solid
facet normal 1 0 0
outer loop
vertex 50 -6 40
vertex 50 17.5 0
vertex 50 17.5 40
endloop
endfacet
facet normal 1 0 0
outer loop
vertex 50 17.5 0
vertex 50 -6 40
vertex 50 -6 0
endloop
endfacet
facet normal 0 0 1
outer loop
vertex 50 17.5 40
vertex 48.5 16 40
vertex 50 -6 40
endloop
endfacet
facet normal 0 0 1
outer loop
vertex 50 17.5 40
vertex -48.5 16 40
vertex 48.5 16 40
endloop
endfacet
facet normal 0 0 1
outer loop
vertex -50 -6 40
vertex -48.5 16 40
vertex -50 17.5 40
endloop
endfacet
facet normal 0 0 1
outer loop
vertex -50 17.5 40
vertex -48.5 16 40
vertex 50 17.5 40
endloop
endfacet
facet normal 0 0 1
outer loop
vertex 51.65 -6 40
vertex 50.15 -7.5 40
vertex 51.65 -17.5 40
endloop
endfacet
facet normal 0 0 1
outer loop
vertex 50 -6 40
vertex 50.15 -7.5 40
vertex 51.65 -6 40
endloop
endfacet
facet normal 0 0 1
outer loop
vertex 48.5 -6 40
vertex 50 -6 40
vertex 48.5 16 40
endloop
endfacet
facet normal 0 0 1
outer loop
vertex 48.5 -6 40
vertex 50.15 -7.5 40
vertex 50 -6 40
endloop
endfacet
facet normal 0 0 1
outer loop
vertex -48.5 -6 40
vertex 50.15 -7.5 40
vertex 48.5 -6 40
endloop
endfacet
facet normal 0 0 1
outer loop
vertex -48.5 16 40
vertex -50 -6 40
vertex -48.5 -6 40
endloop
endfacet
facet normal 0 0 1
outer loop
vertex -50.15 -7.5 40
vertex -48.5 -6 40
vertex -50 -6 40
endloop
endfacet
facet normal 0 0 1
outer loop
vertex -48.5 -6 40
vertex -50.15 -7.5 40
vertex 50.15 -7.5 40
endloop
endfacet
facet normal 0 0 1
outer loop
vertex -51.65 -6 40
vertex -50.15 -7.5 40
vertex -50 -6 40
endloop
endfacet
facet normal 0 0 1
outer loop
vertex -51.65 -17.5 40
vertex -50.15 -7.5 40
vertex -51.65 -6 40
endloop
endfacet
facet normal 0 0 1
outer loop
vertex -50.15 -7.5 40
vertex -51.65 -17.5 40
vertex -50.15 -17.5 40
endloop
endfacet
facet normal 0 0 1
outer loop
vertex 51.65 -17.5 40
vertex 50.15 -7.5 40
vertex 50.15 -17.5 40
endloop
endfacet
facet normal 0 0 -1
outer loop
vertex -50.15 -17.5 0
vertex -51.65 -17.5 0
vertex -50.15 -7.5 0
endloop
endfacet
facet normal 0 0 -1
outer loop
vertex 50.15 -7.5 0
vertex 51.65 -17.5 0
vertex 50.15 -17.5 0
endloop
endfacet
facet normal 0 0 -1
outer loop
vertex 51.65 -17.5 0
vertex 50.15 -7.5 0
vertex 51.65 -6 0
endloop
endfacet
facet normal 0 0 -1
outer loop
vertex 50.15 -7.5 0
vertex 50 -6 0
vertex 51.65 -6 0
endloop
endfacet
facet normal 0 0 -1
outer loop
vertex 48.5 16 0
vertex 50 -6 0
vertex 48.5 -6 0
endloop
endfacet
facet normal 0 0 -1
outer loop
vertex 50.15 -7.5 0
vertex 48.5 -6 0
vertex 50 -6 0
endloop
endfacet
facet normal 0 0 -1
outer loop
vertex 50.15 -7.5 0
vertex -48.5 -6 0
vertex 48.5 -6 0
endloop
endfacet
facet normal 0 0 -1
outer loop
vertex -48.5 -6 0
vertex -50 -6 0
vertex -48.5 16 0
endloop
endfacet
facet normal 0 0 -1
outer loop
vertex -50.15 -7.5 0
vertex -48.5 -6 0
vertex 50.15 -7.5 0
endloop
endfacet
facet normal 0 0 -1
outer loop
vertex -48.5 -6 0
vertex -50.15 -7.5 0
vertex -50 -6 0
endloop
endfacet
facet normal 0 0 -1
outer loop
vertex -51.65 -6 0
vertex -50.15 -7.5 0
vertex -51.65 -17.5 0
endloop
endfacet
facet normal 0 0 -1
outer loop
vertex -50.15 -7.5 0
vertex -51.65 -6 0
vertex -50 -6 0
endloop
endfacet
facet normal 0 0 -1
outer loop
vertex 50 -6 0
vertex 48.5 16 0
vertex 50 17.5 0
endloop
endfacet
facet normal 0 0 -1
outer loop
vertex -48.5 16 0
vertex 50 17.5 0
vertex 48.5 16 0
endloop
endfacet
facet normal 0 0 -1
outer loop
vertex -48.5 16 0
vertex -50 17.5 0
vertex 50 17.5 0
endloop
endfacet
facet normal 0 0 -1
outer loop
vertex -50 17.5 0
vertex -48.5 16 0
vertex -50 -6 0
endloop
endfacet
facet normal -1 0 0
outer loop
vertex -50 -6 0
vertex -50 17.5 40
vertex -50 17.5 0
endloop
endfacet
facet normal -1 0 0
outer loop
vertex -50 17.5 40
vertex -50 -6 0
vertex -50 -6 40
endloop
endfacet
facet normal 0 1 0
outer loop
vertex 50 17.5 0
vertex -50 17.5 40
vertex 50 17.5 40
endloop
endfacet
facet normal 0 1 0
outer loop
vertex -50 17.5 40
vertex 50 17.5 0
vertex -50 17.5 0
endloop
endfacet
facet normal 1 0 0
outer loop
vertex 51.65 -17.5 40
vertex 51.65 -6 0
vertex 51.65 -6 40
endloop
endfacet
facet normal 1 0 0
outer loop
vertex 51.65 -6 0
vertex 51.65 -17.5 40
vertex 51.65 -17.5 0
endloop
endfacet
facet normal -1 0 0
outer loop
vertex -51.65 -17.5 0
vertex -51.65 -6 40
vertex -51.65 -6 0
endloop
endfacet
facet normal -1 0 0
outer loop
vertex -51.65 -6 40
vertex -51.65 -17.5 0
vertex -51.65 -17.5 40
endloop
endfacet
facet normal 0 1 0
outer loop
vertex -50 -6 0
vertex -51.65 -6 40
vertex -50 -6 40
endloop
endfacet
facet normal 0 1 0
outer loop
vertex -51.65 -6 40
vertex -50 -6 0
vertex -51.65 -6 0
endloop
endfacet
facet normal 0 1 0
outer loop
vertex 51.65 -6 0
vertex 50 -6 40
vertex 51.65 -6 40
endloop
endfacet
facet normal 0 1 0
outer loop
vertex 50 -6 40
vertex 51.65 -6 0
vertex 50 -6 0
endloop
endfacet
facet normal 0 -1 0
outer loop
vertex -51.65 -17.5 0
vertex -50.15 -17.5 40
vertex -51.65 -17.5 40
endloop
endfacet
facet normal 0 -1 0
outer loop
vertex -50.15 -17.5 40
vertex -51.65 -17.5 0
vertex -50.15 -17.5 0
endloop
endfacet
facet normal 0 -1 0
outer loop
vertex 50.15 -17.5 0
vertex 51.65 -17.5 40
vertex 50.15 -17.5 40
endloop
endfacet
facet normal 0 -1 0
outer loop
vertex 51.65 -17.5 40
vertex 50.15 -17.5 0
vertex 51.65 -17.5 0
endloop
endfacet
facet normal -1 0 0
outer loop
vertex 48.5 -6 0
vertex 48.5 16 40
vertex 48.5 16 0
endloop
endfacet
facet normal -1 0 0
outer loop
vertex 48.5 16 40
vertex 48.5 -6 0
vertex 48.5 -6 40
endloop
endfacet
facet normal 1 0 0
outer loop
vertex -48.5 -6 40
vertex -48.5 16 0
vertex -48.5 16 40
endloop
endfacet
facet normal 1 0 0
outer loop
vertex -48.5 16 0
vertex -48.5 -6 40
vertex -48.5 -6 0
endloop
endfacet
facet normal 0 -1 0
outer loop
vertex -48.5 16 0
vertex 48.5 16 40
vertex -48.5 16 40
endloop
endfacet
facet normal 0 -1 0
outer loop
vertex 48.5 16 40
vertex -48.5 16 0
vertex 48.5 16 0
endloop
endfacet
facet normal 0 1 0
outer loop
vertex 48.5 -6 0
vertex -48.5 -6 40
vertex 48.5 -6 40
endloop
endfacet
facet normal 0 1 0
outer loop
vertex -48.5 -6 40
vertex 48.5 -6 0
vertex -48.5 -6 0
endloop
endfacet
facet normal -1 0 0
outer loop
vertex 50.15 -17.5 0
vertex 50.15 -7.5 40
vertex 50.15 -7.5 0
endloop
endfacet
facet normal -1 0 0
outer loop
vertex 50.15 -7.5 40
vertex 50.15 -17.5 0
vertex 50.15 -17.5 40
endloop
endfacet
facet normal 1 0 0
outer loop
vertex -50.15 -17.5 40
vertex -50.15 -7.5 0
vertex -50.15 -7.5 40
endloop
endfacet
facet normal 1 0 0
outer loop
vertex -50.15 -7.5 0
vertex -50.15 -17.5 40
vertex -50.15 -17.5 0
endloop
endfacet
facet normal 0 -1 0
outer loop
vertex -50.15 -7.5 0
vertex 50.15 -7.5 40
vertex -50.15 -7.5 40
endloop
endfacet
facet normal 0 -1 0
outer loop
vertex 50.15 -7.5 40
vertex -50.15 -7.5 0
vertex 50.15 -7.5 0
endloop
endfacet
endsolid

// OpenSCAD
//
// Card organizer for Android: Netrunner LCG
//
// Copyright 2014 Magnus Kvevlander <magu@me.com>
//
// Creative Commons Attribution-NonCommercial 3.0 Unported (CC BY-NC 3.0)
// http://creativecommons.org/licenses/by-nc/3.0/
//

// Size of hole on the x axis
x = 97;
// Ditto on the y axis
y = 22;
// Height of the part
z = 40;

// Material thickness (1.5 sliced with 0.5 perimiters works perfect)
thk = 1.5;
// Length of gripping ledges (set to <= 0 for an edge piece without ledges altogether)
grip = 10;
// Tolerance of grip (0.15 gives a lean, but not to snug, fit; YMMV)
tol = 0.15;


// Measures of the fattest stack in the
// base game (with standard sleeves): 67x95x20 mm
// Default variables with a 1 mm gap around the
// stack for ease of insertion and extraction.

// Material thickness of 1.5 mm prints with perfect
// stability with perimiters of 0.5 mm.

// Default grip length and tolerance makes for a
// lean, but not deformingly snug, fit.

// Centering translation
translate ([-(thk + x / 2), -(thk + (y - grip) / 2), 0])
difference () {
	union () {
// Body boundary
		cube ([x + 2 * thk, y + 2 * thk, z]);
// Grip boundary
		if (grip > 0)
			translate ([-(thk + tol), -grip, 0])
				cube ([x + 4 * thk + 2 * tol, grip + thk, z]);
	}
// Cavity cutout
	translate ([thk, thk, -thk])
		cube ([x, y, z + 2 * thk]);
// Grip cutout
	translate ([-tol, -(grip + thk), -thk])
		cube ([x + 2 * thk + 2 * tol, grip + thk, z + 2 * thk]);
}
